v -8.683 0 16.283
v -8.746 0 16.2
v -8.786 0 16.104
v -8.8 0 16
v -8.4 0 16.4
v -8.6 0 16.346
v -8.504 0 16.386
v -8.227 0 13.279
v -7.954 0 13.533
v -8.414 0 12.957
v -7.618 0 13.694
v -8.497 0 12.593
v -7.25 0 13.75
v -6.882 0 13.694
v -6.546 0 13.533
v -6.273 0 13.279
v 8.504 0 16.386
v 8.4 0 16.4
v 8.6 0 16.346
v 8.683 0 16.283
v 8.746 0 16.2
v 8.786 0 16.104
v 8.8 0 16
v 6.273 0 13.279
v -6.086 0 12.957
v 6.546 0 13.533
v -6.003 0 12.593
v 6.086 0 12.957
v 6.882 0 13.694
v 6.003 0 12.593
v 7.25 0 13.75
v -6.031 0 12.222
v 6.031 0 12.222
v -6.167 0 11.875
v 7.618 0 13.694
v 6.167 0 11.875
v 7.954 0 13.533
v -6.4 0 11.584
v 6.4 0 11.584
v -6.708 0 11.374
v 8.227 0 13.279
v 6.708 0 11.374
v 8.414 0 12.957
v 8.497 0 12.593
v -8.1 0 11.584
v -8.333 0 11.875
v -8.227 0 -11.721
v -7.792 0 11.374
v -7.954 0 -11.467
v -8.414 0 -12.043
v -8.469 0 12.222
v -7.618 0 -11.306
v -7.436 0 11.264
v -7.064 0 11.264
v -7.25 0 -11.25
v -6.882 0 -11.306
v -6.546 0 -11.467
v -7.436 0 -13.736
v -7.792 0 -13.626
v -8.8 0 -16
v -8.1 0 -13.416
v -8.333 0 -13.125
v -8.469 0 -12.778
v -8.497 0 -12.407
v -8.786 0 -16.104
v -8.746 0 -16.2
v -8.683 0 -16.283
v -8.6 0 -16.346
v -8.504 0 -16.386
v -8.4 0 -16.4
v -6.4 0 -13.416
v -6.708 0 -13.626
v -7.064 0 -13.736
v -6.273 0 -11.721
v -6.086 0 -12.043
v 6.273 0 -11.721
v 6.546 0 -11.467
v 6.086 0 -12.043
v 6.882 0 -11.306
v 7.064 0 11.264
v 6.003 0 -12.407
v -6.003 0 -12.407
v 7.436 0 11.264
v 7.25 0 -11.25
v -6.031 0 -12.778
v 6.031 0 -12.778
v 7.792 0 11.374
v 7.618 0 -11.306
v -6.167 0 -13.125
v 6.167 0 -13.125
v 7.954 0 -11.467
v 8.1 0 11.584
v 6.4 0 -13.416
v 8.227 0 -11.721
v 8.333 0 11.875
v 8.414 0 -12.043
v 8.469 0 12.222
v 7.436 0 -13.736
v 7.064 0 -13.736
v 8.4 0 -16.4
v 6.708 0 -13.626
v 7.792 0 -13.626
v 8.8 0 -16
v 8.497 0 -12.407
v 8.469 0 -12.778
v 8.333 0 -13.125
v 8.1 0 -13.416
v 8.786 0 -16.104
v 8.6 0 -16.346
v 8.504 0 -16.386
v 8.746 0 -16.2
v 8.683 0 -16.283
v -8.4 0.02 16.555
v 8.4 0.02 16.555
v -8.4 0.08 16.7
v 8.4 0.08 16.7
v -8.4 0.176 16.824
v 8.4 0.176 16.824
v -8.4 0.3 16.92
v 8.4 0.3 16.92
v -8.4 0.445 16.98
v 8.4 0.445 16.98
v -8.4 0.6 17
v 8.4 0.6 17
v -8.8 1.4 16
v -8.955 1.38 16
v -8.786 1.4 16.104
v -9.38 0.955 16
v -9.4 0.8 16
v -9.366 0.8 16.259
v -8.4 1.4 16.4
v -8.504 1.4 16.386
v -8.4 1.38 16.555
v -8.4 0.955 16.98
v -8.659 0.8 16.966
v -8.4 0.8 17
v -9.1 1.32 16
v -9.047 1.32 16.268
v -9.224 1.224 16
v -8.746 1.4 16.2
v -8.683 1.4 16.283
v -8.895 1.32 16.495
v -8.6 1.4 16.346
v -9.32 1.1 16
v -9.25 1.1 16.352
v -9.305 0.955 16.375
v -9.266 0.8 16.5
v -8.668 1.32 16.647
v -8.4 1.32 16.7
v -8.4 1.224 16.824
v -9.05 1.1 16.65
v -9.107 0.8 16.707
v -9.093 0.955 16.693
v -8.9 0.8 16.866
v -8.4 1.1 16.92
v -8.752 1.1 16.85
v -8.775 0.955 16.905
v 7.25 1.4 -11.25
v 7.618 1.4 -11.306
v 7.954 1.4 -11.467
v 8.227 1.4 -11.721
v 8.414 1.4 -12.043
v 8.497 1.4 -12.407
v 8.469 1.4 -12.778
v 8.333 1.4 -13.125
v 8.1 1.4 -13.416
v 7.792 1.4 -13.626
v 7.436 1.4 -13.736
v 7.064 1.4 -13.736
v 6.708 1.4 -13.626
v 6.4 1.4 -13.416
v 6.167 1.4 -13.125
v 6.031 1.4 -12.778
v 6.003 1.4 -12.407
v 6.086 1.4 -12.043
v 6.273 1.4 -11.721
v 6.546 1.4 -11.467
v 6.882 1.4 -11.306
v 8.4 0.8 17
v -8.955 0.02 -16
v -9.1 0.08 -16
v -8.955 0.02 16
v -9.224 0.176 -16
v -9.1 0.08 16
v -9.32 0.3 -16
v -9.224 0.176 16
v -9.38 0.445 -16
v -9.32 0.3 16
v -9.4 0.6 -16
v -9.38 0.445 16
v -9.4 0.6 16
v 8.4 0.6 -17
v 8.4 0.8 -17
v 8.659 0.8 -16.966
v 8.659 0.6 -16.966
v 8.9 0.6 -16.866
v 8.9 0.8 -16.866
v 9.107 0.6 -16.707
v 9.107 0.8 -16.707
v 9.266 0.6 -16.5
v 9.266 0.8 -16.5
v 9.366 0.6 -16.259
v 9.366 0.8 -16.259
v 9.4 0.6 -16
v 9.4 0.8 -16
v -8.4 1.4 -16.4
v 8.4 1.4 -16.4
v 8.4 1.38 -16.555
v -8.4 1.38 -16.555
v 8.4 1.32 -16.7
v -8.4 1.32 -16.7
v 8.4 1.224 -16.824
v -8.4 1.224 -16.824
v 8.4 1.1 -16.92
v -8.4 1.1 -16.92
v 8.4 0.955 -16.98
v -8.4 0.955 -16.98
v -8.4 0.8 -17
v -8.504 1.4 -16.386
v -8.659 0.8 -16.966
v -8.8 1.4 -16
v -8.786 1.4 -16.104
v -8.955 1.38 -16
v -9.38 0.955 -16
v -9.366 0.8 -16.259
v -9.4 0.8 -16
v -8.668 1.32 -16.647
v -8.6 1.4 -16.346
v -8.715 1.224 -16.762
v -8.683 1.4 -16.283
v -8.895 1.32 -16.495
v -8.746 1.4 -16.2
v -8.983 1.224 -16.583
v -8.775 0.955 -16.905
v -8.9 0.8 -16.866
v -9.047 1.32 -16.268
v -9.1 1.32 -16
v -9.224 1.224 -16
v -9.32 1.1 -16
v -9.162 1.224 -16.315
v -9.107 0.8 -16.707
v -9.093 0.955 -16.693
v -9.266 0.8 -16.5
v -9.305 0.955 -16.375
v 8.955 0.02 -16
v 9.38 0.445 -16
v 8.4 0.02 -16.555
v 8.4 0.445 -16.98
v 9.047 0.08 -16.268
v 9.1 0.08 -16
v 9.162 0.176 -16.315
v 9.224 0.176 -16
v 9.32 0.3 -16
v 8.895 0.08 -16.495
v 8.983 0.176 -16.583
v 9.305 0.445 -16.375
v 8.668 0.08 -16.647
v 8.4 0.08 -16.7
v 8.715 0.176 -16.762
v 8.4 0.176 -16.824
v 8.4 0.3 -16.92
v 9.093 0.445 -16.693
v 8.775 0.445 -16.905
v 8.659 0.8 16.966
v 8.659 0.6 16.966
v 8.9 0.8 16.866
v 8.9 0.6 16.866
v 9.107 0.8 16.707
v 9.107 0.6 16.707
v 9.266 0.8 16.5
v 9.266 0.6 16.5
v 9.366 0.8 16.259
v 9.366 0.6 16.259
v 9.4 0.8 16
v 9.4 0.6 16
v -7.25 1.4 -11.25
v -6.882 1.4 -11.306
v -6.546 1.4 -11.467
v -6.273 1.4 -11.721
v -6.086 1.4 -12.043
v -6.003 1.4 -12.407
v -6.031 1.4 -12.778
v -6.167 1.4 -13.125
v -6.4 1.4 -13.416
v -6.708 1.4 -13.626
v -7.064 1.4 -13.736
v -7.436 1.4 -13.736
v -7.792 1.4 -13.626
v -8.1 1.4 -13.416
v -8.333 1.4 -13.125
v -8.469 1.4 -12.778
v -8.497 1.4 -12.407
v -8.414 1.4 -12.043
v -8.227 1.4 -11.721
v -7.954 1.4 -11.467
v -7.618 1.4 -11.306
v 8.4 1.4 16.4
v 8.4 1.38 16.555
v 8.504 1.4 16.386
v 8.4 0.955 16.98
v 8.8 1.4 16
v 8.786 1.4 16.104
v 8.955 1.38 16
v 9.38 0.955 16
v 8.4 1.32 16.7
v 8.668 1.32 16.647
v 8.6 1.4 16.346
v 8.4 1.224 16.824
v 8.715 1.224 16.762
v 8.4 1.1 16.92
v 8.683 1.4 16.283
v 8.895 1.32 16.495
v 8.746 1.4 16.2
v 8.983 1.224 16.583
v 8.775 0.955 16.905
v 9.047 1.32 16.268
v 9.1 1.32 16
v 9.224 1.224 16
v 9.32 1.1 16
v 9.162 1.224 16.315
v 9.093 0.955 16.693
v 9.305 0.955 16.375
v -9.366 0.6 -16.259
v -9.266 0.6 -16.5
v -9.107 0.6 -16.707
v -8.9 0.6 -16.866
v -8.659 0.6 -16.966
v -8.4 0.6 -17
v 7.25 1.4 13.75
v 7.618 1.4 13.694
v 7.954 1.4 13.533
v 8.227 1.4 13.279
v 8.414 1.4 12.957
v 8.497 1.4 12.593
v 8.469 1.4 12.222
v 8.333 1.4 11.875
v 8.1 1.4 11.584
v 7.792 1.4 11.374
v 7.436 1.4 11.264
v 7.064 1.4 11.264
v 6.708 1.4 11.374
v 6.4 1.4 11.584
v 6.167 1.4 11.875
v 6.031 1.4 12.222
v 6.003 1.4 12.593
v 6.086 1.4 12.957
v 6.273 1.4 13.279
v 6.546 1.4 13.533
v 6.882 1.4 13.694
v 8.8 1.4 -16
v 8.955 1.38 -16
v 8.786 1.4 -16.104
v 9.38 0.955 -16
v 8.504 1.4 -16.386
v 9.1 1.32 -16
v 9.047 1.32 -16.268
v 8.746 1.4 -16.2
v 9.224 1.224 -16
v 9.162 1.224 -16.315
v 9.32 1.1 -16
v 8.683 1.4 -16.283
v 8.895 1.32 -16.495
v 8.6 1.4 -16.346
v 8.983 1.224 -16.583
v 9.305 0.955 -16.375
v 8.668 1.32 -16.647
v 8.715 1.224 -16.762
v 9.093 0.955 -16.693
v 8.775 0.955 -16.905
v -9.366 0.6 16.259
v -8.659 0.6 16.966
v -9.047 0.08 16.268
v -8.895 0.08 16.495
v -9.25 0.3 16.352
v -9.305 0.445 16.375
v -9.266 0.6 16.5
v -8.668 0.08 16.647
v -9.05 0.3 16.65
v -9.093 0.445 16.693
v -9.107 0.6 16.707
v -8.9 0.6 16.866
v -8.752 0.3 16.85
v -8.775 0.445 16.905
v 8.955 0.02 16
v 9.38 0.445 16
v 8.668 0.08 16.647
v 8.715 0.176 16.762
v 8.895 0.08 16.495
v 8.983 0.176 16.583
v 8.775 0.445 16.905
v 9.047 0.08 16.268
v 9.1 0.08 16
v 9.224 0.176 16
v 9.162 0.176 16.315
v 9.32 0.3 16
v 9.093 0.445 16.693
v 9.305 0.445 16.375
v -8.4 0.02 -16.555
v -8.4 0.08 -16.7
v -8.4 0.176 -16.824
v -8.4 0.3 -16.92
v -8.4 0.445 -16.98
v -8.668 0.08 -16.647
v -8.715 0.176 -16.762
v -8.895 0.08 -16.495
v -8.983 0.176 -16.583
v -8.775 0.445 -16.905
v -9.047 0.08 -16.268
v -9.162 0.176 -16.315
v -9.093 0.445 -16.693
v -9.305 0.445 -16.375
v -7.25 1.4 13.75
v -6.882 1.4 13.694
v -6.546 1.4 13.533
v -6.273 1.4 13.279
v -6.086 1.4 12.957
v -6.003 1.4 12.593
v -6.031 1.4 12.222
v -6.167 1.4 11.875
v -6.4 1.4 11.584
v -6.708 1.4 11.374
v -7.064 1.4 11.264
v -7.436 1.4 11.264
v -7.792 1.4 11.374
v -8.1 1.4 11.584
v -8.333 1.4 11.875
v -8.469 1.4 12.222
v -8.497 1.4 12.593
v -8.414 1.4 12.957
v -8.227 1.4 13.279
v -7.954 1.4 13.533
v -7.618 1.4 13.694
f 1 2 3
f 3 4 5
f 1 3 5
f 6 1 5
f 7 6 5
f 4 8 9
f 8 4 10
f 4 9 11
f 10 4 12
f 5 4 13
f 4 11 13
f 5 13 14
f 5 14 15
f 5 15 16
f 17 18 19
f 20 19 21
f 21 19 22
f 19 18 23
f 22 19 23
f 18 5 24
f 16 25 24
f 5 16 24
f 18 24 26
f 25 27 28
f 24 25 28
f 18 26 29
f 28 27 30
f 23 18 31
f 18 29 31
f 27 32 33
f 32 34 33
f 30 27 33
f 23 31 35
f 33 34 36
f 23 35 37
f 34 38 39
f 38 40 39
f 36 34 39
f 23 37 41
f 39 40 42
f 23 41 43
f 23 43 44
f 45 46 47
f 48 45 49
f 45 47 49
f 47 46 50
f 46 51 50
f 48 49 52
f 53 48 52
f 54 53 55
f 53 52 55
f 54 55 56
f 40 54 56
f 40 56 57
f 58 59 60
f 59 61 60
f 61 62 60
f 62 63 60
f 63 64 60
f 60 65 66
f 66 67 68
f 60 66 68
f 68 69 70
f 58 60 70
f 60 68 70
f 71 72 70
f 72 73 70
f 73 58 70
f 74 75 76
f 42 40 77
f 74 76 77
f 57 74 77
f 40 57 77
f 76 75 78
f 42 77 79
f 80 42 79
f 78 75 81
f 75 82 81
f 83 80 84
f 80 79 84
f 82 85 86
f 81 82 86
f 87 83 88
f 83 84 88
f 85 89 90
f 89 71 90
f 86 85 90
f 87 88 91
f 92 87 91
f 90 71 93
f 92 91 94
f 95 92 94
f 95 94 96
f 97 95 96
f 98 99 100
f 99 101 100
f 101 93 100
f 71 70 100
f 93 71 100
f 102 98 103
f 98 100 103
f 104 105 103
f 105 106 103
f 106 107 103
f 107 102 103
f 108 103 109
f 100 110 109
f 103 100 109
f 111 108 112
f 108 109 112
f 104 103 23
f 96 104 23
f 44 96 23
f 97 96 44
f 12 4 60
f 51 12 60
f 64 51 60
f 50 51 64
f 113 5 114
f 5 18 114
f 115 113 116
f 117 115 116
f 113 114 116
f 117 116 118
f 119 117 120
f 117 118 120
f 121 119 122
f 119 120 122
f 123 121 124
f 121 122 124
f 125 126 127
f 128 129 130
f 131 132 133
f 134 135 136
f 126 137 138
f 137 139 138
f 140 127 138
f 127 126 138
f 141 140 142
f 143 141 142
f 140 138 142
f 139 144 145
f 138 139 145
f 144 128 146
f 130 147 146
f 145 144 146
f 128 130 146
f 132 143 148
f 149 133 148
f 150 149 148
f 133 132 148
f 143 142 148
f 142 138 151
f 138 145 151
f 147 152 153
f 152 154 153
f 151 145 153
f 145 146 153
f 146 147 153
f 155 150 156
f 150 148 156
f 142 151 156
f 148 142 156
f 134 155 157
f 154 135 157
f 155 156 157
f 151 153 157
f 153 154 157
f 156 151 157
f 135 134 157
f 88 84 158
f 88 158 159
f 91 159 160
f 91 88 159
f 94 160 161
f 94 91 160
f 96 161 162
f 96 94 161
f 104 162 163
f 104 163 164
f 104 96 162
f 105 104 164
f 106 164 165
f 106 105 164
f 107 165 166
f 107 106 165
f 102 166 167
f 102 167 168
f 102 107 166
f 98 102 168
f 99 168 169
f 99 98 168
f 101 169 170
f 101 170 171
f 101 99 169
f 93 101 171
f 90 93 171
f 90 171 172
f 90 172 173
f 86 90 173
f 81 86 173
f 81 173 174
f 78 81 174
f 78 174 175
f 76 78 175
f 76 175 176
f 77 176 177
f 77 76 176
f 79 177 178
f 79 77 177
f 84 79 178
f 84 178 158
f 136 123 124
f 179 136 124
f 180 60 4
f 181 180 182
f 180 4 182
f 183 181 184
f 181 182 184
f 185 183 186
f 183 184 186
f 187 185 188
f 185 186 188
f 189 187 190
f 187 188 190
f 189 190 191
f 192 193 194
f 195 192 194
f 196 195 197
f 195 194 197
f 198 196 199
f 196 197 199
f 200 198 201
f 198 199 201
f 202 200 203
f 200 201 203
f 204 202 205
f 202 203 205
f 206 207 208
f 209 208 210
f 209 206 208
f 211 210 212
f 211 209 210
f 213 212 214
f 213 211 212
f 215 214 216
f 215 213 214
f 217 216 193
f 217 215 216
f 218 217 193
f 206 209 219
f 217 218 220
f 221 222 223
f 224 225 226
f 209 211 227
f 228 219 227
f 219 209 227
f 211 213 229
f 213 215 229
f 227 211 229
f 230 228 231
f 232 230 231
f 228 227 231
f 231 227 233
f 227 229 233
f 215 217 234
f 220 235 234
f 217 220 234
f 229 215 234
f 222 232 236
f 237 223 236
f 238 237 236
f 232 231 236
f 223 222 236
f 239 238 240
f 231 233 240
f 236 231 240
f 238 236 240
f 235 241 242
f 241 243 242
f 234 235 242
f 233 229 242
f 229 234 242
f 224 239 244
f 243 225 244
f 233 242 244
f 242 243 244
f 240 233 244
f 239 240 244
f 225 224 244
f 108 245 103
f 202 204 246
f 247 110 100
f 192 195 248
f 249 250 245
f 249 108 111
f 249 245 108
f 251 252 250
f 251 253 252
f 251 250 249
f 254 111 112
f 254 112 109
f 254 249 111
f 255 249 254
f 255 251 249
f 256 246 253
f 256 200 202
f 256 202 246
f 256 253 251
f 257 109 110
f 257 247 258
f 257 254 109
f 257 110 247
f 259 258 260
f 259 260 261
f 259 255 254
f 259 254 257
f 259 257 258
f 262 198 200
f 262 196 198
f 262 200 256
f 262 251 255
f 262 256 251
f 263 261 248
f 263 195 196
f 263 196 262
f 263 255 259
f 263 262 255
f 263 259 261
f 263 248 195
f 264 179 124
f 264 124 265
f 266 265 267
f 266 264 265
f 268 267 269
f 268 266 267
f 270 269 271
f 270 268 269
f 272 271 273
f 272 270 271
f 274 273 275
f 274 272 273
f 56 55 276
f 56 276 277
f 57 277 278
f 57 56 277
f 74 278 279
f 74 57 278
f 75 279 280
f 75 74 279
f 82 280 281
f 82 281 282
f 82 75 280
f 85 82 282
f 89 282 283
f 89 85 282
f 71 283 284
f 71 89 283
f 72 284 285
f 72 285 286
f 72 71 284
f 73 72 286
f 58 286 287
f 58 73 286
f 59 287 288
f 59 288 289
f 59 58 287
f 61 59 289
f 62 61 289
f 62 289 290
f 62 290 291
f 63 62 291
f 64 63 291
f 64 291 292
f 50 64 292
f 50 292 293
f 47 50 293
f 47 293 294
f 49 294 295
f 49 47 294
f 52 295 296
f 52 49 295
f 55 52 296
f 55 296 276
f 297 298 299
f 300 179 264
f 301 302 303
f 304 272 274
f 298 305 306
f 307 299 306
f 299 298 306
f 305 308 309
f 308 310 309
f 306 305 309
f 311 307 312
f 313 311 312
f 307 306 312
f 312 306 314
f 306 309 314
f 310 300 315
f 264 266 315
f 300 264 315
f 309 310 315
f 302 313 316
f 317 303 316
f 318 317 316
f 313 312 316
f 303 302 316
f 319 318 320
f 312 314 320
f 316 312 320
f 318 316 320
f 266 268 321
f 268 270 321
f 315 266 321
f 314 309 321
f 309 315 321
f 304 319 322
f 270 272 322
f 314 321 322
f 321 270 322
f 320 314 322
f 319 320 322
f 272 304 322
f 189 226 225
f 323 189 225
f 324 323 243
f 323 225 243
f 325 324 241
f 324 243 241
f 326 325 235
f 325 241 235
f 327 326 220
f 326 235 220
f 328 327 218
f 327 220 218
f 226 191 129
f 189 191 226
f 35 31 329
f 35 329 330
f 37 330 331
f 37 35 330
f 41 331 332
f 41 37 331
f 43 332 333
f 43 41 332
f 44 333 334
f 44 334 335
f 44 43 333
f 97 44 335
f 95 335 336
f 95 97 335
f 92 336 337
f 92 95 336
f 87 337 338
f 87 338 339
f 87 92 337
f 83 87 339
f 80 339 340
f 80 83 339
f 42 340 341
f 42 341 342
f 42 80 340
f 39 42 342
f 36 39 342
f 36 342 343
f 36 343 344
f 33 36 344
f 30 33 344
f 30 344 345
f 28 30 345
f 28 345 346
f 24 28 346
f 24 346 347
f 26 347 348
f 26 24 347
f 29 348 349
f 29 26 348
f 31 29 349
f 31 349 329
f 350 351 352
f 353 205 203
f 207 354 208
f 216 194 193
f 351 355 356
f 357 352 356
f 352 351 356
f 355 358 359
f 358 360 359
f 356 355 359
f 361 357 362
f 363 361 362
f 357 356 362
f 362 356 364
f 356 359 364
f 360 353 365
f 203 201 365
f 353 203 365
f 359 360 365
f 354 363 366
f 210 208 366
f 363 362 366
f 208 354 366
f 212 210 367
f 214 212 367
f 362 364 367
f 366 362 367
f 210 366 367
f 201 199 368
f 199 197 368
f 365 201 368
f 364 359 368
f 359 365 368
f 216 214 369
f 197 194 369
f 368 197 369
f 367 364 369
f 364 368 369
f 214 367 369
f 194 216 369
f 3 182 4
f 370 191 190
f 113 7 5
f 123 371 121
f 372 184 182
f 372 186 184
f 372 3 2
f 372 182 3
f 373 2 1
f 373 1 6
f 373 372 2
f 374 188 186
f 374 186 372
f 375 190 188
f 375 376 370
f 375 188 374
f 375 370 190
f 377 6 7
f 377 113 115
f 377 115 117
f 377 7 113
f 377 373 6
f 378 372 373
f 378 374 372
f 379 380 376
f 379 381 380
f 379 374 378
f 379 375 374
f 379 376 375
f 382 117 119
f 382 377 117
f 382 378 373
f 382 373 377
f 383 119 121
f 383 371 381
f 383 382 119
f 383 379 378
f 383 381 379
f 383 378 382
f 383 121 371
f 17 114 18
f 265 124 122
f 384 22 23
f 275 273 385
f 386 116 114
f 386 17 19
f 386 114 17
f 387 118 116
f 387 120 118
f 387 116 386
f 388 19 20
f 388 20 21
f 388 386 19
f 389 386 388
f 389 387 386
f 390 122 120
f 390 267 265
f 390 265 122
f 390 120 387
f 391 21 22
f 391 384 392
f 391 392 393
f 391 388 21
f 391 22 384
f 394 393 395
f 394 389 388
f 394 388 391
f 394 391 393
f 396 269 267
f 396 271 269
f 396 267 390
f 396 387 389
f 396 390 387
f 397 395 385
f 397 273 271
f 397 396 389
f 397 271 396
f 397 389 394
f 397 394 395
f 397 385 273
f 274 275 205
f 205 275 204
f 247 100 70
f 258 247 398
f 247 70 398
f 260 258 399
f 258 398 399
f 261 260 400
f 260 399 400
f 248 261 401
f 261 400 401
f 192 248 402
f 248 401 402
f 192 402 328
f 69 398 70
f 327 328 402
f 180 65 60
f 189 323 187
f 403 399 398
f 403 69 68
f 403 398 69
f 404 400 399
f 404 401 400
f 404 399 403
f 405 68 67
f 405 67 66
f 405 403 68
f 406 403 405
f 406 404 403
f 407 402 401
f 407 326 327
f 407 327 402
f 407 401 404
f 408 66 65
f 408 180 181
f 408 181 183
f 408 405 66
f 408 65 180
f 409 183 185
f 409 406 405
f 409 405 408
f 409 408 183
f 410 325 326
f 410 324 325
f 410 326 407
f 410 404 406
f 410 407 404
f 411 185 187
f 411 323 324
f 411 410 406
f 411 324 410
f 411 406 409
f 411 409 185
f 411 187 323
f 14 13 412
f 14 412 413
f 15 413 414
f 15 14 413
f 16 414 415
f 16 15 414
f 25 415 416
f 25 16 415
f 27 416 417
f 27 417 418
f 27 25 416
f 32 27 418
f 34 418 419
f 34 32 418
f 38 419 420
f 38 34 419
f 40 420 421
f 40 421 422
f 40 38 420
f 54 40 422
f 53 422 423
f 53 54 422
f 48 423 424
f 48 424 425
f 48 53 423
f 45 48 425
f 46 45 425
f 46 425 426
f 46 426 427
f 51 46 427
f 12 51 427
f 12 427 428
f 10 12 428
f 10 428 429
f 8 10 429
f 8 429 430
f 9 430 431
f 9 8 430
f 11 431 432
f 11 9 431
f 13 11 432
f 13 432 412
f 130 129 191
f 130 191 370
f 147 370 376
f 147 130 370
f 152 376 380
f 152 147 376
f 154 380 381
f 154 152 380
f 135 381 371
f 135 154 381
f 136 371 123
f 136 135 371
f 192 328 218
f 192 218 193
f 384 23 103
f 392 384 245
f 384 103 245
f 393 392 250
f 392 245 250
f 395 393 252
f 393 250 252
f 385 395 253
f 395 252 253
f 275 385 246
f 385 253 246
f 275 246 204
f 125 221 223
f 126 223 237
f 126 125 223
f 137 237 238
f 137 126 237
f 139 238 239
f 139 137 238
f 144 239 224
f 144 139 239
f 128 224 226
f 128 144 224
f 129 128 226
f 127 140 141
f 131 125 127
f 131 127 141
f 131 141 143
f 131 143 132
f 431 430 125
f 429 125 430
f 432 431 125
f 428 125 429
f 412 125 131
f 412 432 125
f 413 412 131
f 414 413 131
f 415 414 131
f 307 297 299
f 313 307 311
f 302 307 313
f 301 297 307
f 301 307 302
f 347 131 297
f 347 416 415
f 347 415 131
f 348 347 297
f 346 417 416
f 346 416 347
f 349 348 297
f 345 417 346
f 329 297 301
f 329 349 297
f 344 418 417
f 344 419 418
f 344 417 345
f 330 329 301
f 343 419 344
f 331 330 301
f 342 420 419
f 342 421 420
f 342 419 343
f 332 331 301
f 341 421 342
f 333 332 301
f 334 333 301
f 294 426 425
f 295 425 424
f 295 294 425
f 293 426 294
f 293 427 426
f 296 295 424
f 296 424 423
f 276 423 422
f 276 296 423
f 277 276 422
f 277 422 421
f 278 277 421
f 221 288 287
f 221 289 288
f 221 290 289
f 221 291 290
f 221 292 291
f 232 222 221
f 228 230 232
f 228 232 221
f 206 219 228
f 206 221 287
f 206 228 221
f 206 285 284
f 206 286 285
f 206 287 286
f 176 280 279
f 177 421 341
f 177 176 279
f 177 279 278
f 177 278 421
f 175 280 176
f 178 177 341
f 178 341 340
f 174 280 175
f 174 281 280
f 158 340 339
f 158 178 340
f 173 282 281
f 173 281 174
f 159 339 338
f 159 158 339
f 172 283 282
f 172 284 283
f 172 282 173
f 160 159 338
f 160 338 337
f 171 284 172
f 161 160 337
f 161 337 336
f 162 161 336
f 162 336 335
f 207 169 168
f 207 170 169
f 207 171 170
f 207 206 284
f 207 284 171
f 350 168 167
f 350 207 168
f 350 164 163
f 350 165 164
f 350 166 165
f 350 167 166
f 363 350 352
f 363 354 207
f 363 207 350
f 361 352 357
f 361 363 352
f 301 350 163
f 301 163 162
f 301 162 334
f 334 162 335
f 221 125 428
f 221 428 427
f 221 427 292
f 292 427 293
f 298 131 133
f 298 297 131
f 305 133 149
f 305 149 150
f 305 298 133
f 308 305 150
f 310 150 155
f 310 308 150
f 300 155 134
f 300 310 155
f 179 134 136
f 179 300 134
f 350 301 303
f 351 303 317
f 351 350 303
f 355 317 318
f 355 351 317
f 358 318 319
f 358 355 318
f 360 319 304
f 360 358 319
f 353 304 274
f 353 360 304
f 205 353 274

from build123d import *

# Parameters (mm, degrees)
SKETCH1_W                 = 18.8
SKETCH1_H                 = 34
SKETCH1_R                 = 1.25
CABLE_PLATE_EXTRUDE_DEPTH = 1.4
FILLET2_R                 = 1
FILLET1_R                 = 0.6


with BuildPart() as part:
    # Sketch1 → Cable Plate Extrude (new body)
    with BuildSketch(Plane(origin=(0, 0, 0), x_dir=(1, 0, 0), z_dir=(0, 1, 0))):
        Rectangle(SKETCH1_W, SKETCH1_H)
        with Locations(Location((-7.25, 12.5, 0), (0, 0, 270))):
            Circle(SKETCH1_R, mode=Mode.SUBTRACT)
        with Locations(Location((7.25, 12.5, 0), (0, 0, 270))):
            Circle(SKETCH1_R, mode=Mode.SUBTRACT)
        with Locations(Location((-7.25, -12.5, 0), (0, 0, 270))):
            Circle(SKETCH1_R, mode=Mode.SUBTRACT)
        with Locations(Location((7.25, -12.5, 0), (0, 0, 270))):
            Circle(SKETCH1_R, mode=Mode.SUBTRACT)
    extrude(amount=CABLE_PLATE_EXTRUDE_DEPTH)

    # Fillet2
    fillet2_edges = [part.edges().sort_by_distance(p)[0] for p in [
        (-9.4, 0.7, -17),
        (9.4, 0.7, -17),
        (9.4, 0.7, 17),
        (-9.4, 0.7, 17),
    ]]
    fillet(fillet2_edges, radius=FILLET2_R)

    # Fillet1
    fillet1_edges = [part.edges().sort_by_distance(p)[0] for p in [
        (0, 0, 17),
        (0, 1.4, 17),
        (-9.4, 0, 0),
        (0, 0, -17),
        (9.4, 0, 0),
        (-9.107106781, 0, -16.707106781),
        (9.107106781, 0, -16.707106781),
        (9.107106781, 0, 16.707106781),
        (-9.107106781, 0, 16.707106781),
        (-9.4, 1.4, 0),
        (9.4, 1.4, 0),
        (0, 1.4, -17),
        (-9.107106781, 1.4, -16.707106781),
        (9.107106781, 1.4, -16.707106781),
        (9.107106781, 1.4, 16.707106781),
        (-9.107106781, 1.4, 16.707106781),
    ]]
    fillet(fillet1_edges, radius=FILLET1_R)


solid = part.part
